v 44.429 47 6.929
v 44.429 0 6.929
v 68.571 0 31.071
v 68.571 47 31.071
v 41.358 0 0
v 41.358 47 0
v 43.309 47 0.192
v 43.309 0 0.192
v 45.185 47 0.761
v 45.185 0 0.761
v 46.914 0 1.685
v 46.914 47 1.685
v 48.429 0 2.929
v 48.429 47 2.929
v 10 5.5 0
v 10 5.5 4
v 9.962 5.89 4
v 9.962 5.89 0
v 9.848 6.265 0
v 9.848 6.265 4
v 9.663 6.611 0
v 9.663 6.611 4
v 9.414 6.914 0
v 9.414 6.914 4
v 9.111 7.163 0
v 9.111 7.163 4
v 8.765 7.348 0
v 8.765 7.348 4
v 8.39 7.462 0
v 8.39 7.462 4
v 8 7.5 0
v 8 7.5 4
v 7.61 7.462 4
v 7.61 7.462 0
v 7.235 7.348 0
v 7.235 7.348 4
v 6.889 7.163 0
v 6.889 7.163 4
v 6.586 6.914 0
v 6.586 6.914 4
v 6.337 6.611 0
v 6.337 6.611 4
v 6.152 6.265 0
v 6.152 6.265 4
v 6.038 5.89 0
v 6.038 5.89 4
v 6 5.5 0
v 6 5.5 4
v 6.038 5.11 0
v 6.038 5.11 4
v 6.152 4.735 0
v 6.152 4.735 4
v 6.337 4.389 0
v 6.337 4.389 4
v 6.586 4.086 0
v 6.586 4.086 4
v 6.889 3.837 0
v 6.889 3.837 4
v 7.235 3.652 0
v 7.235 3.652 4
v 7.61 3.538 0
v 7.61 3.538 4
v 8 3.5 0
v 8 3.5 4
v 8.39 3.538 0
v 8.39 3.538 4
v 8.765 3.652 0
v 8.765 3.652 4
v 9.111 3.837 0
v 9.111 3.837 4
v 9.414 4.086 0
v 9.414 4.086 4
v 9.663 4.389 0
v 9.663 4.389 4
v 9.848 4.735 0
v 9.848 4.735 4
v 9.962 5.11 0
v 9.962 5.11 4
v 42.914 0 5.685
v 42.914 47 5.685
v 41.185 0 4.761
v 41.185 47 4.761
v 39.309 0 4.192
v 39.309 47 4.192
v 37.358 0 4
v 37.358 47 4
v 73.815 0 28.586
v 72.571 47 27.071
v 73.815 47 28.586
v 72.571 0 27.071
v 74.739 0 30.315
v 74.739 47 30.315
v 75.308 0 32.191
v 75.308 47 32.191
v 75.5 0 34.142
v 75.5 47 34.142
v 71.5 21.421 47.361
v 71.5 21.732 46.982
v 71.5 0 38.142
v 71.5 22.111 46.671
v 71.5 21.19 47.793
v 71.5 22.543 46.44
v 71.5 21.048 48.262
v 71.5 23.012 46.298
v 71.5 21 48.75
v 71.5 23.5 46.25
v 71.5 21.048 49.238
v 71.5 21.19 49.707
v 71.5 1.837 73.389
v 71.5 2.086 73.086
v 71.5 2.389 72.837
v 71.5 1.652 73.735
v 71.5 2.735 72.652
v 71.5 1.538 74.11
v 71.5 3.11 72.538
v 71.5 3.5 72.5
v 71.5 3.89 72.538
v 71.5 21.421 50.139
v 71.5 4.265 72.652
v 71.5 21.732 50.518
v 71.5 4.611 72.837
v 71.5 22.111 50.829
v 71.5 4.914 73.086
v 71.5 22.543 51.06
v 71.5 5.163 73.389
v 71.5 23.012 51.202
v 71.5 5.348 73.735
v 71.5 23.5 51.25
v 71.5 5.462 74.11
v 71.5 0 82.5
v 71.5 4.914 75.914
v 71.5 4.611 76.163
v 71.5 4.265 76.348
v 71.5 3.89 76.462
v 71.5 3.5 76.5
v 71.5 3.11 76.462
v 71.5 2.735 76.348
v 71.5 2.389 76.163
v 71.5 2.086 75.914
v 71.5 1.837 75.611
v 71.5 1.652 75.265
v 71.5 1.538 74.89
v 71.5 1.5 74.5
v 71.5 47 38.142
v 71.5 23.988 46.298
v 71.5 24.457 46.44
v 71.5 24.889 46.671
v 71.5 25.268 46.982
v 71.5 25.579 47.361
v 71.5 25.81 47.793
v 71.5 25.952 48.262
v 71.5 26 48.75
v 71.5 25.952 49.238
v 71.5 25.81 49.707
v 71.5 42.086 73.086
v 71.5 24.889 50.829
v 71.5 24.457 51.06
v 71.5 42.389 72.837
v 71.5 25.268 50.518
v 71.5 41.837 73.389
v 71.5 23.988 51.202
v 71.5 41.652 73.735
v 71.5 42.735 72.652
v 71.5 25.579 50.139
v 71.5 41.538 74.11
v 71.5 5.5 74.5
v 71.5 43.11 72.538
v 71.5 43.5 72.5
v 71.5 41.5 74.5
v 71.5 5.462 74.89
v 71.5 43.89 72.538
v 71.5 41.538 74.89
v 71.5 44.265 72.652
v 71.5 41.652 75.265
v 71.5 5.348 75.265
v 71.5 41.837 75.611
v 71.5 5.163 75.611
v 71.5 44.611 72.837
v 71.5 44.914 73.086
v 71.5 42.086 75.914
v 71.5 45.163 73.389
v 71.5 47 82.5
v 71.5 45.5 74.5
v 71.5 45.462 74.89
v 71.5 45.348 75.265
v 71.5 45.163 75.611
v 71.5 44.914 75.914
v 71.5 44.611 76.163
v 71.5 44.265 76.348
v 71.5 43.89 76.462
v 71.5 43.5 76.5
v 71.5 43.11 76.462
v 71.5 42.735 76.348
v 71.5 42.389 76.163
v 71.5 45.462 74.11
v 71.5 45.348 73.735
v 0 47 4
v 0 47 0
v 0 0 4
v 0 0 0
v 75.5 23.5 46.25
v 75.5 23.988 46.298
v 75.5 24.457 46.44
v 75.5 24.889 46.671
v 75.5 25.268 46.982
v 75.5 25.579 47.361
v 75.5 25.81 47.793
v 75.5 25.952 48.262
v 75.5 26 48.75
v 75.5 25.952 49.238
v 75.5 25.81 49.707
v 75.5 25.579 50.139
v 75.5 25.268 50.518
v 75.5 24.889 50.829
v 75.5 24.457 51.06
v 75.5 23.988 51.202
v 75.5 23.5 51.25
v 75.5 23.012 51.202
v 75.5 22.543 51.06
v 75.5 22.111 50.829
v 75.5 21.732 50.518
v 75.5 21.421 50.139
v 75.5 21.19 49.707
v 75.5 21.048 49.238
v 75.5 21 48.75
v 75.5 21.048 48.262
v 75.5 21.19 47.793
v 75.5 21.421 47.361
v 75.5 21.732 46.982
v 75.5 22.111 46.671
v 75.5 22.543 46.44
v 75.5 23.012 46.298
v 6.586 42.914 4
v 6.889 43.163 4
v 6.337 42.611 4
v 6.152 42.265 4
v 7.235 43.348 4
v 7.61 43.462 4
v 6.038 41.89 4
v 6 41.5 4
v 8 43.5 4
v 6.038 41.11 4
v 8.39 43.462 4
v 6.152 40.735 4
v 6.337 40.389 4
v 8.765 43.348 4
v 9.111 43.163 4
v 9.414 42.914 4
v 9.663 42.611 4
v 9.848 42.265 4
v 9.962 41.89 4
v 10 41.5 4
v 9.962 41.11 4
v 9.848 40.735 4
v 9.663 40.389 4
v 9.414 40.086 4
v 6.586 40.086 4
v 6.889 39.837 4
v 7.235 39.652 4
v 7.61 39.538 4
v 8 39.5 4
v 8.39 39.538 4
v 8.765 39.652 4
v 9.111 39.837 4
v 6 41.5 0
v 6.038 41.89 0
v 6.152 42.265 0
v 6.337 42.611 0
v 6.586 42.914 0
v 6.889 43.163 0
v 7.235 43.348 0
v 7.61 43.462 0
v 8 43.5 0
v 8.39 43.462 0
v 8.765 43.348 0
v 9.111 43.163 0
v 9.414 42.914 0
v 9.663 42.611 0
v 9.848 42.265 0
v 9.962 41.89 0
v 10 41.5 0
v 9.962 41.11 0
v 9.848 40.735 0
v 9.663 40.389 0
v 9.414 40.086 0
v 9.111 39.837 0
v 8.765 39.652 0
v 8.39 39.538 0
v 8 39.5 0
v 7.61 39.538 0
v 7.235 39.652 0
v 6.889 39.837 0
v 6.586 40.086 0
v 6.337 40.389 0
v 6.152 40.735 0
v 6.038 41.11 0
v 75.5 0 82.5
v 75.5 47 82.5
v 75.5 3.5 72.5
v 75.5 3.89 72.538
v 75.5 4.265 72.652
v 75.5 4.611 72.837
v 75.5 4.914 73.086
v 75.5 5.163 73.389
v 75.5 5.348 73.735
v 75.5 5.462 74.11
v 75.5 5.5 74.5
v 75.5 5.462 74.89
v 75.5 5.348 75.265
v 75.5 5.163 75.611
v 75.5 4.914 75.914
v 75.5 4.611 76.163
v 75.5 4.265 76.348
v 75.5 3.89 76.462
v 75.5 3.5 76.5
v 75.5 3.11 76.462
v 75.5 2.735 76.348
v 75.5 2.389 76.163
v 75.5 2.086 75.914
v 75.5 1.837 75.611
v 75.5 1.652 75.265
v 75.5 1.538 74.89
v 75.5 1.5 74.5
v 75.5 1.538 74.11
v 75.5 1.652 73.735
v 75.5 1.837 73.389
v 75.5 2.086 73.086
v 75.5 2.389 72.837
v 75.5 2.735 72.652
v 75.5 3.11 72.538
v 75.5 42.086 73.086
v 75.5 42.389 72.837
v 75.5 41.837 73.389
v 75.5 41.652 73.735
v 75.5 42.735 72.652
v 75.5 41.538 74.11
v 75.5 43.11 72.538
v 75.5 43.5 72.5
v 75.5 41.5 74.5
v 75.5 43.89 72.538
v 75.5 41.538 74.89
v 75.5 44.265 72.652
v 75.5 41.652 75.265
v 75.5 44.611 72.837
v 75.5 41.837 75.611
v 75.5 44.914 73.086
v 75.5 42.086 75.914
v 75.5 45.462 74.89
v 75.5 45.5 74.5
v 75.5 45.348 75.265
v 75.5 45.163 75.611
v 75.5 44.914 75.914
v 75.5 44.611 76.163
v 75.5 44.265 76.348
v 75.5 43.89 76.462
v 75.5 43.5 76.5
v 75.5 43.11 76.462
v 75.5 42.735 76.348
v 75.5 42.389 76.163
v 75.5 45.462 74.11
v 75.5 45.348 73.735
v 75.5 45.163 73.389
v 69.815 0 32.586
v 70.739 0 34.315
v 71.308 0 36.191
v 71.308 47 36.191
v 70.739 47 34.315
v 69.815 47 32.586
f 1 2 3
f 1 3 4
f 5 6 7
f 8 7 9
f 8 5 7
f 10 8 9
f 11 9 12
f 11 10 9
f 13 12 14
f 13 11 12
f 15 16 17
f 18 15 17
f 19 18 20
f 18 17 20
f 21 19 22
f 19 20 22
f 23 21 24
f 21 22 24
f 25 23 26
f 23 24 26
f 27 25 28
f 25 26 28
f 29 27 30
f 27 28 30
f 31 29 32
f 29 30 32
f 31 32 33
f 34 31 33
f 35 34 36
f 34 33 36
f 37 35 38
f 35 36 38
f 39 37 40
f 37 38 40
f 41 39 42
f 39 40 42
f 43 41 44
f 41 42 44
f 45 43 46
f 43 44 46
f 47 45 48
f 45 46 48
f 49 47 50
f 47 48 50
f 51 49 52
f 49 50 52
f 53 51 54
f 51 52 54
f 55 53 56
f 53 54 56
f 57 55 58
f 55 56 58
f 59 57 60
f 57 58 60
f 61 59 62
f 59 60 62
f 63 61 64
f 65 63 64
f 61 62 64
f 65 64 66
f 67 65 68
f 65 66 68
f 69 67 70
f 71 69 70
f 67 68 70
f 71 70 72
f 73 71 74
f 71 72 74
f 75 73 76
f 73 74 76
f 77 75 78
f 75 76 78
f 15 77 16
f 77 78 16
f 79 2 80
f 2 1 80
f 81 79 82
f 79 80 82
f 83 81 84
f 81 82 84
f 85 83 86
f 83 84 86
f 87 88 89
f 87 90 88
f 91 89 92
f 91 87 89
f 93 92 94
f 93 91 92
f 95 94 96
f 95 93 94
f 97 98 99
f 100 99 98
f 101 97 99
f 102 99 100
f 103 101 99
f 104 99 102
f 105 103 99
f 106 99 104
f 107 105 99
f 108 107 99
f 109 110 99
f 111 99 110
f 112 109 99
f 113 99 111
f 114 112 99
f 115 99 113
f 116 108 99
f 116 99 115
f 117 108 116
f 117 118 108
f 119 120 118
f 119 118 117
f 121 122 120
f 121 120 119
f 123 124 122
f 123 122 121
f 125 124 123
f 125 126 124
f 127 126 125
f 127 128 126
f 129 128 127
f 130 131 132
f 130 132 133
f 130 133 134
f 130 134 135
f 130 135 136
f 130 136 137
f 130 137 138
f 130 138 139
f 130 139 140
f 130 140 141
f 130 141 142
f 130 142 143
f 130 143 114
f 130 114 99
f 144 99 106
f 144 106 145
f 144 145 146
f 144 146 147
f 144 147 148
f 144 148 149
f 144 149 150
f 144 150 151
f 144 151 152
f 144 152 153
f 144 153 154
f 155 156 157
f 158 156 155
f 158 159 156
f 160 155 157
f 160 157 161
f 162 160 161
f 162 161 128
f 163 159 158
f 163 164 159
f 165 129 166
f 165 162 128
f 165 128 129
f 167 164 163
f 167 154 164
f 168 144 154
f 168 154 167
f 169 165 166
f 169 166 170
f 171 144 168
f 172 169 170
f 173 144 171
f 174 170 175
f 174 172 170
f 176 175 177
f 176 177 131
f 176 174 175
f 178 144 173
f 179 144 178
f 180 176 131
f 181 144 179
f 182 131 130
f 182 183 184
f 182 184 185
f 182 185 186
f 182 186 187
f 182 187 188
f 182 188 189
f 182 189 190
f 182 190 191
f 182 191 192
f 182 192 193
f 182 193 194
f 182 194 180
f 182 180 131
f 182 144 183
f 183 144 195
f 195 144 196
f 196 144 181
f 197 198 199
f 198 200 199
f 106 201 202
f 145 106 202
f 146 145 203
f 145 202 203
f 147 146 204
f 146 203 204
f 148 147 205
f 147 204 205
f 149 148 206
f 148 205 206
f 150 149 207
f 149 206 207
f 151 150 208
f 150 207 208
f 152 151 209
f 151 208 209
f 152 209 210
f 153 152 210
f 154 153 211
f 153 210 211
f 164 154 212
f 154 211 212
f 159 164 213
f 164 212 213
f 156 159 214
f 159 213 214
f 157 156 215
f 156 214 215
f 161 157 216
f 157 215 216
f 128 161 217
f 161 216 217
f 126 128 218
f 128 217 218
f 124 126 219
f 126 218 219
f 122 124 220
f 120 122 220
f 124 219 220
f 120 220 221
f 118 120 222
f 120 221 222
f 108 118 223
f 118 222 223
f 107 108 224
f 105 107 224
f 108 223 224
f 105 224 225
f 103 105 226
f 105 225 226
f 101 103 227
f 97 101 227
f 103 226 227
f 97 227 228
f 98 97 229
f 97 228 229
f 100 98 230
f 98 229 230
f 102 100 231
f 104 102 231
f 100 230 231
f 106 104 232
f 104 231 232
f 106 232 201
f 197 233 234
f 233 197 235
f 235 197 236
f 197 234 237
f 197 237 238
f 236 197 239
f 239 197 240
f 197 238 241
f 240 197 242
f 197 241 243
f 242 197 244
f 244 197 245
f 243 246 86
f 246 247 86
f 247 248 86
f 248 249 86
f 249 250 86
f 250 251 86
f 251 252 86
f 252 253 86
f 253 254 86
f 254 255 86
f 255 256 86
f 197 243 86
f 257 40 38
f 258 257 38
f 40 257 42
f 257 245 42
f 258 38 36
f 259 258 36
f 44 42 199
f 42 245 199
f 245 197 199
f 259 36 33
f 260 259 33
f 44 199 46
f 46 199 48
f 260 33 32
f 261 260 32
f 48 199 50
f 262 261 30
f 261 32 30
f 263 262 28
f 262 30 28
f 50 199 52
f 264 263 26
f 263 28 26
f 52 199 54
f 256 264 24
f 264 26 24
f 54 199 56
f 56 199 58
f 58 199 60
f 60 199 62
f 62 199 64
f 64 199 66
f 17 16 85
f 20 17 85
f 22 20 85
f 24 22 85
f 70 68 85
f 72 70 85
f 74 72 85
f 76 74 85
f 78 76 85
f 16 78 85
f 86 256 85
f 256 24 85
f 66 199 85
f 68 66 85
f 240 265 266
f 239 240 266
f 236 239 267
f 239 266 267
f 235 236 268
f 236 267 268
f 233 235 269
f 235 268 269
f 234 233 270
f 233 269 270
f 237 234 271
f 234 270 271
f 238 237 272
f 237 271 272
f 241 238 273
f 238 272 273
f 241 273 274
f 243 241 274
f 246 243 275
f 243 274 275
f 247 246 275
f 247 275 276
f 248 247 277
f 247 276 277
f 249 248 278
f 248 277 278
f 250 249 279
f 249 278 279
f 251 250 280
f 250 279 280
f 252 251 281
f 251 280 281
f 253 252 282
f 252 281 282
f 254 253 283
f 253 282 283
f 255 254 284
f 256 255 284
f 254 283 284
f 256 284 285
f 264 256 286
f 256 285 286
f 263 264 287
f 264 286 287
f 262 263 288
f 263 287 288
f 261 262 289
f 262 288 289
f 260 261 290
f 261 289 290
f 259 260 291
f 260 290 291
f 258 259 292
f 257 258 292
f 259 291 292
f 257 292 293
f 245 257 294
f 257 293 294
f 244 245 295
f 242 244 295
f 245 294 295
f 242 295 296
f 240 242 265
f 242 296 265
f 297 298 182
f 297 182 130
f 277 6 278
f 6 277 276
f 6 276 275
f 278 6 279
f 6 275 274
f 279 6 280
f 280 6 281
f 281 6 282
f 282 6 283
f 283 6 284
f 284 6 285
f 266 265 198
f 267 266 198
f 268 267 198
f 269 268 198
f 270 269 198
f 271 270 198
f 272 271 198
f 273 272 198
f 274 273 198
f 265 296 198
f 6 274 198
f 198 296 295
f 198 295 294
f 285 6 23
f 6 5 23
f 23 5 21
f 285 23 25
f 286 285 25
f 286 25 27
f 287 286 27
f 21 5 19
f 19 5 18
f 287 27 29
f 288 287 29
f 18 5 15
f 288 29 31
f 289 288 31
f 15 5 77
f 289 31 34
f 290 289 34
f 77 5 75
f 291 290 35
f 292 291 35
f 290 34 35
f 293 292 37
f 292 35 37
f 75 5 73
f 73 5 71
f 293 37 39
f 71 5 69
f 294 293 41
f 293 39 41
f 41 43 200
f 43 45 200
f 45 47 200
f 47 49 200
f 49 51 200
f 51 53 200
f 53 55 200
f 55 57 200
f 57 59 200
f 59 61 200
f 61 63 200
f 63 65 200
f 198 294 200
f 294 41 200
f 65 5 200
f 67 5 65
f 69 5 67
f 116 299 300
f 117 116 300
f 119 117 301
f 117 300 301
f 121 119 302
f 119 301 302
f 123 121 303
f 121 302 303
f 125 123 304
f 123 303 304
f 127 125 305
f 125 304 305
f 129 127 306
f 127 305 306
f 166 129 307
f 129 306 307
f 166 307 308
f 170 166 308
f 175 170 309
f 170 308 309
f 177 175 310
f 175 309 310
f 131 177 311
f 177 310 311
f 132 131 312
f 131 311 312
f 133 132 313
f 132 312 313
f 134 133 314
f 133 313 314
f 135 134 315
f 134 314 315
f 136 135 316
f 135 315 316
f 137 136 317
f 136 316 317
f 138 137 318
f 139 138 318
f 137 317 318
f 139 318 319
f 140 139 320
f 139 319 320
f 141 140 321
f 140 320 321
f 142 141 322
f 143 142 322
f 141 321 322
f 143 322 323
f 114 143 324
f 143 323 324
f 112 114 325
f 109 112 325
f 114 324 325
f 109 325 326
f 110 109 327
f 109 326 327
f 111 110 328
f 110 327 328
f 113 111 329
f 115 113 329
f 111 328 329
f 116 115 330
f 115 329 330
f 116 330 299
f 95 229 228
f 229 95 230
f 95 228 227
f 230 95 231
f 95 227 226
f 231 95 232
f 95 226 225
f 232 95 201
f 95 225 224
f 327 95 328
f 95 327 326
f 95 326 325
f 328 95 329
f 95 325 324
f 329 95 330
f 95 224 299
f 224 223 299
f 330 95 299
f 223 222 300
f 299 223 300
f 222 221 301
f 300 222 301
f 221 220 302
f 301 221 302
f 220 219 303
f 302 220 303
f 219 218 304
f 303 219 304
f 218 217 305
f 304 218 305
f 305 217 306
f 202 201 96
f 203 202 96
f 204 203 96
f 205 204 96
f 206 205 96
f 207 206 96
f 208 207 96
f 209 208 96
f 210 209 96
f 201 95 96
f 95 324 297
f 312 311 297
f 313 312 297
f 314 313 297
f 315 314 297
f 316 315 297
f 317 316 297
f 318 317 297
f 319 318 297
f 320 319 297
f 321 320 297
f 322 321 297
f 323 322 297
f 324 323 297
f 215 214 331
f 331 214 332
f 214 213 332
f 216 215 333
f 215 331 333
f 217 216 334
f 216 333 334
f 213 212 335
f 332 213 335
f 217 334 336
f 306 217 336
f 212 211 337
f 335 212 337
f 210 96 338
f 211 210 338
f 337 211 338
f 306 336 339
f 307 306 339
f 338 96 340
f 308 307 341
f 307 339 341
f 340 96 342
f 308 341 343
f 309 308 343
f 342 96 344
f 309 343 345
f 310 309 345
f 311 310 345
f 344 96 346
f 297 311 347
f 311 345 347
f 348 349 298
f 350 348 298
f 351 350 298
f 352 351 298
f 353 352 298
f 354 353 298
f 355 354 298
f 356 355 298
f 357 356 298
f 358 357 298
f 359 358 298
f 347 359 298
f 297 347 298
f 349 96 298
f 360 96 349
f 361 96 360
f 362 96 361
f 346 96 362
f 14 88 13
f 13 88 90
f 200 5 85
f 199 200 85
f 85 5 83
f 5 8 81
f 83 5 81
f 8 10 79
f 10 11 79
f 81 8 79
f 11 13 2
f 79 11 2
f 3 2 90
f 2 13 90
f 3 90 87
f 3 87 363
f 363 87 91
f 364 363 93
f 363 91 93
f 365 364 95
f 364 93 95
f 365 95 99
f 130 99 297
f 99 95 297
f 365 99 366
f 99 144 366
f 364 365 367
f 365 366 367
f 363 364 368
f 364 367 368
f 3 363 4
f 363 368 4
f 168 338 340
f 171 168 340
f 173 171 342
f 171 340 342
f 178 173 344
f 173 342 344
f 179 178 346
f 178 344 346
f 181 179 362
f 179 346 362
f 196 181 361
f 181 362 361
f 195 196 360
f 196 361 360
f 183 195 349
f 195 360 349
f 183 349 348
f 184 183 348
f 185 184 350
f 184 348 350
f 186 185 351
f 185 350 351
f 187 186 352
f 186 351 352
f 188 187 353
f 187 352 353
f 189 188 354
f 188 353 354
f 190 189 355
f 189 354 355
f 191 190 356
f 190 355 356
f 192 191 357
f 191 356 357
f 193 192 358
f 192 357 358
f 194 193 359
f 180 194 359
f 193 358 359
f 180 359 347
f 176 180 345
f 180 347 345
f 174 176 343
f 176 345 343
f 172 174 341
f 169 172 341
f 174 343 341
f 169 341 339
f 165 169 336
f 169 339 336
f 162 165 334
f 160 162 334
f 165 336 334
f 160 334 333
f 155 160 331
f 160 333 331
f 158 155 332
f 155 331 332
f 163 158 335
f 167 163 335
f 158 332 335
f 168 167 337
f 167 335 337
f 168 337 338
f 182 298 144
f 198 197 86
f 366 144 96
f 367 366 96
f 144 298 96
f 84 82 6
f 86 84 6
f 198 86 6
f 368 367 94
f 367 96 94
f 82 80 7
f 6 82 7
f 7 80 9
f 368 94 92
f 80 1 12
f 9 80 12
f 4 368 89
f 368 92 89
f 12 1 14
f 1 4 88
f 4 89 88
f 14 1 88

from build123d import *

# Parameters (mm, degrees)
SKETCH2_W            = 71.5
SKETCH2_H            = 11
BOSS_EXTRUDE2_DEPTH  = 4
SKETCH3_R            = 2
CUT_EXTRUDE1_DEPTH   = 4
SKETCH4_W            = 4
SKETCH4_H            = 4
BOSS_EXTRUDE3_DEPTH  = 11
SKETCH5_W            = 4
SKETCH5_H            = 11
BOSS_EXTRUDE4_DEPTH  = 76
SKETCH7_W            = 75.5
SKETCH7_H            = 11
SKETCH7_R            = 2
BOSS_EXTRUDE5_DEPTH  = 4
SKETCH8_W            = 80
SKETCH8_H            = 11
BOSS_EXTRUDE8_DEPTH  = 4
BOSS_EXTRUDE9_DEPTH  = 25
SKETCH10_R           = 2.5
CUT_EXTRUDE3_DEPTH   = 4
CHAMFER1_SIZE        = 30
SKETCH13_R           = 2
CUT_EXTRUDE4_DEPTH   = 4
BOSS_EXTRUDE10_DEPTH = 4
FILLET1_R            = 10


with BuildPart() as part:
    # Sketch2 → Boss-Extrude2 (new body)
    with BuildSketch(Plane.XY):
        with Locations((35.75, 5.5)):
            Rectangle(SKETCH2_W, SKETCH2_H)
    extrude(amount=BOSS_EXTRUDE2_DEPTH)

    # Sketch3 → Cut-Extrude1 (cut)
    with BuildSketch(Plane.XY.offset(4)):
        with Locations((8, 5.5)):
            Circle(SKETCH3_R)
    extrude(amount=-CUT_EXTRUDE1_DEPTH, mode=Mode.SUBTRACT)

    # Sketch4 → Boss-Extrude3 (add)
    with BuildSketch(Plane(origin=(0, 11, 0), x_dir=(1, 0, 0), z_dir=(0, 1, 0))):
        with Locations((73.5, -2)):
            Rectangle(SKETCH4_W, SKETCH4_H)
    extrude(amount=-BOSS_EXTRUDE3_DEPTH)

    # Sketch5 → Boss-Extrude4 (add)
    with BuildSketch(Plane.XY.offset(4)):
        with Locations((73.5, 5.5)):
            Rectangle(SKETCH5_W, SKETCH5_H)
    extrude(amount=BOSS_EXTRUDE4_DEPTH)



with BuildPart() as body_2:
    # Sketch7 → Boss-Extrude5 (new body)
    with BuildSketch(Plane(origin=(0, 0, 0), x_dir=(-1, 0, 0), z_dir=(0, 0, -1))):
        with Locations((-37.75, 41.5)):
            Rectangle(SKETCH7_W, SKETCH7_H)
        with Locations((-8, 41.5)):
            Circle(SKETCH7_R, mode=Mode.SUBTRACT)
    extrude(amount=-BOSS_EXTRUDE5_DEPTH)

    # Sketch8 → Boss-Extrude8 (add)
    with BuildSketch(Plane(origin=(75.5, 0, 0), x_dir=(0, 0, -1), z_dir=(1, 0, 0))):
        with Locations((-40, 41.5)):
            Rectangle(SKETCH8_W, SKETCH8_H)
    extrude(amount=-BOSS_EXTRUDE8_DEPTH)


with BuildPart() as part_1:
    add(part.part)

    add(body_2.part)  # Boss-Extrude9 merges body 2
    # Sketch9 → Boss-Extrude9 (add)
    with BuildSketch(Plane(origin=(0, 11, 0), x_dir=(1, 0, 0), z_dir=(0, 1, 0))):
        Polygon((75.5, 0), (0, 0), (0, -4), (71.5, -4), (71.5, -80), (75.5, -80), align=None)
    extrude(amount=BOSS_EXTRUDE9_DEPTH)

    # Sketch10 → Cut-Extrude3 (cut)
    with BuildSketch(Plane(origin=(75.5, 0, 0), x_dir=(0, 0, -1), z_dir=(1, 0, 0))):
        with Locations((-48.75, 23.5)):
            Circle(SKETCH10_R)
    extrude(amount=-CUT_EXTRUDE3_DEPTH, mode=Mode.SUBTRACT)

    # Chamfer1
    chamfer1_edges = [part_1.edges().sort_by_distance(p)[0] for p in [
        (75.5, 23.5, 0),
        (71.5, 23.5, 4),
    ]]
    chamfer(chamfer1_edges, length=CHAMFER1_SIZE)

    # Sketch13 → Cut-Extrude4 (cut)
    with BuildSketch(Plane(origin=(75.5, 0, 0), x_dir=(0, 0, -1), z_dir=(1, 0, 0))):
        with Locations((-74.5, 3.5)):
            Circle(SKETCH13_R)
        with Locations((-74.5, 43.5)):
            Circle(SKETCH13_R)
    extrude(amount=-CUT_EXTRUDE4_DEPTH, mode=Mode.SUBTRACT)

    # Sketch14 → Boss-Extrude10 (add)
    with BuildSketch(Plane(origin=(75.5, 0, 0), x_dir=(0, 0, -1), z_dir=(1, 0, 0))):
        Polygon((-82.5, 3.5), (-82.5, 47), (-80, 47), (-80, 0), (-82.5, 0), align=None)
    extrude(amount=-BOSS_EXTRUDE10_DEPTH)

    # Fillet1
    fillet1_edges = [part_1.edges().sort_by_distance(p)[0] for p in [
        (71.5, 23.5, 34),
        (41.5, 23.5, 4),
        (75.5, 23.5, 30),
        (45.5, 23.5, 0),
    ]]
    fillet(fillet1_edges, radius=FILLET1_R)


solid = part_1.part
